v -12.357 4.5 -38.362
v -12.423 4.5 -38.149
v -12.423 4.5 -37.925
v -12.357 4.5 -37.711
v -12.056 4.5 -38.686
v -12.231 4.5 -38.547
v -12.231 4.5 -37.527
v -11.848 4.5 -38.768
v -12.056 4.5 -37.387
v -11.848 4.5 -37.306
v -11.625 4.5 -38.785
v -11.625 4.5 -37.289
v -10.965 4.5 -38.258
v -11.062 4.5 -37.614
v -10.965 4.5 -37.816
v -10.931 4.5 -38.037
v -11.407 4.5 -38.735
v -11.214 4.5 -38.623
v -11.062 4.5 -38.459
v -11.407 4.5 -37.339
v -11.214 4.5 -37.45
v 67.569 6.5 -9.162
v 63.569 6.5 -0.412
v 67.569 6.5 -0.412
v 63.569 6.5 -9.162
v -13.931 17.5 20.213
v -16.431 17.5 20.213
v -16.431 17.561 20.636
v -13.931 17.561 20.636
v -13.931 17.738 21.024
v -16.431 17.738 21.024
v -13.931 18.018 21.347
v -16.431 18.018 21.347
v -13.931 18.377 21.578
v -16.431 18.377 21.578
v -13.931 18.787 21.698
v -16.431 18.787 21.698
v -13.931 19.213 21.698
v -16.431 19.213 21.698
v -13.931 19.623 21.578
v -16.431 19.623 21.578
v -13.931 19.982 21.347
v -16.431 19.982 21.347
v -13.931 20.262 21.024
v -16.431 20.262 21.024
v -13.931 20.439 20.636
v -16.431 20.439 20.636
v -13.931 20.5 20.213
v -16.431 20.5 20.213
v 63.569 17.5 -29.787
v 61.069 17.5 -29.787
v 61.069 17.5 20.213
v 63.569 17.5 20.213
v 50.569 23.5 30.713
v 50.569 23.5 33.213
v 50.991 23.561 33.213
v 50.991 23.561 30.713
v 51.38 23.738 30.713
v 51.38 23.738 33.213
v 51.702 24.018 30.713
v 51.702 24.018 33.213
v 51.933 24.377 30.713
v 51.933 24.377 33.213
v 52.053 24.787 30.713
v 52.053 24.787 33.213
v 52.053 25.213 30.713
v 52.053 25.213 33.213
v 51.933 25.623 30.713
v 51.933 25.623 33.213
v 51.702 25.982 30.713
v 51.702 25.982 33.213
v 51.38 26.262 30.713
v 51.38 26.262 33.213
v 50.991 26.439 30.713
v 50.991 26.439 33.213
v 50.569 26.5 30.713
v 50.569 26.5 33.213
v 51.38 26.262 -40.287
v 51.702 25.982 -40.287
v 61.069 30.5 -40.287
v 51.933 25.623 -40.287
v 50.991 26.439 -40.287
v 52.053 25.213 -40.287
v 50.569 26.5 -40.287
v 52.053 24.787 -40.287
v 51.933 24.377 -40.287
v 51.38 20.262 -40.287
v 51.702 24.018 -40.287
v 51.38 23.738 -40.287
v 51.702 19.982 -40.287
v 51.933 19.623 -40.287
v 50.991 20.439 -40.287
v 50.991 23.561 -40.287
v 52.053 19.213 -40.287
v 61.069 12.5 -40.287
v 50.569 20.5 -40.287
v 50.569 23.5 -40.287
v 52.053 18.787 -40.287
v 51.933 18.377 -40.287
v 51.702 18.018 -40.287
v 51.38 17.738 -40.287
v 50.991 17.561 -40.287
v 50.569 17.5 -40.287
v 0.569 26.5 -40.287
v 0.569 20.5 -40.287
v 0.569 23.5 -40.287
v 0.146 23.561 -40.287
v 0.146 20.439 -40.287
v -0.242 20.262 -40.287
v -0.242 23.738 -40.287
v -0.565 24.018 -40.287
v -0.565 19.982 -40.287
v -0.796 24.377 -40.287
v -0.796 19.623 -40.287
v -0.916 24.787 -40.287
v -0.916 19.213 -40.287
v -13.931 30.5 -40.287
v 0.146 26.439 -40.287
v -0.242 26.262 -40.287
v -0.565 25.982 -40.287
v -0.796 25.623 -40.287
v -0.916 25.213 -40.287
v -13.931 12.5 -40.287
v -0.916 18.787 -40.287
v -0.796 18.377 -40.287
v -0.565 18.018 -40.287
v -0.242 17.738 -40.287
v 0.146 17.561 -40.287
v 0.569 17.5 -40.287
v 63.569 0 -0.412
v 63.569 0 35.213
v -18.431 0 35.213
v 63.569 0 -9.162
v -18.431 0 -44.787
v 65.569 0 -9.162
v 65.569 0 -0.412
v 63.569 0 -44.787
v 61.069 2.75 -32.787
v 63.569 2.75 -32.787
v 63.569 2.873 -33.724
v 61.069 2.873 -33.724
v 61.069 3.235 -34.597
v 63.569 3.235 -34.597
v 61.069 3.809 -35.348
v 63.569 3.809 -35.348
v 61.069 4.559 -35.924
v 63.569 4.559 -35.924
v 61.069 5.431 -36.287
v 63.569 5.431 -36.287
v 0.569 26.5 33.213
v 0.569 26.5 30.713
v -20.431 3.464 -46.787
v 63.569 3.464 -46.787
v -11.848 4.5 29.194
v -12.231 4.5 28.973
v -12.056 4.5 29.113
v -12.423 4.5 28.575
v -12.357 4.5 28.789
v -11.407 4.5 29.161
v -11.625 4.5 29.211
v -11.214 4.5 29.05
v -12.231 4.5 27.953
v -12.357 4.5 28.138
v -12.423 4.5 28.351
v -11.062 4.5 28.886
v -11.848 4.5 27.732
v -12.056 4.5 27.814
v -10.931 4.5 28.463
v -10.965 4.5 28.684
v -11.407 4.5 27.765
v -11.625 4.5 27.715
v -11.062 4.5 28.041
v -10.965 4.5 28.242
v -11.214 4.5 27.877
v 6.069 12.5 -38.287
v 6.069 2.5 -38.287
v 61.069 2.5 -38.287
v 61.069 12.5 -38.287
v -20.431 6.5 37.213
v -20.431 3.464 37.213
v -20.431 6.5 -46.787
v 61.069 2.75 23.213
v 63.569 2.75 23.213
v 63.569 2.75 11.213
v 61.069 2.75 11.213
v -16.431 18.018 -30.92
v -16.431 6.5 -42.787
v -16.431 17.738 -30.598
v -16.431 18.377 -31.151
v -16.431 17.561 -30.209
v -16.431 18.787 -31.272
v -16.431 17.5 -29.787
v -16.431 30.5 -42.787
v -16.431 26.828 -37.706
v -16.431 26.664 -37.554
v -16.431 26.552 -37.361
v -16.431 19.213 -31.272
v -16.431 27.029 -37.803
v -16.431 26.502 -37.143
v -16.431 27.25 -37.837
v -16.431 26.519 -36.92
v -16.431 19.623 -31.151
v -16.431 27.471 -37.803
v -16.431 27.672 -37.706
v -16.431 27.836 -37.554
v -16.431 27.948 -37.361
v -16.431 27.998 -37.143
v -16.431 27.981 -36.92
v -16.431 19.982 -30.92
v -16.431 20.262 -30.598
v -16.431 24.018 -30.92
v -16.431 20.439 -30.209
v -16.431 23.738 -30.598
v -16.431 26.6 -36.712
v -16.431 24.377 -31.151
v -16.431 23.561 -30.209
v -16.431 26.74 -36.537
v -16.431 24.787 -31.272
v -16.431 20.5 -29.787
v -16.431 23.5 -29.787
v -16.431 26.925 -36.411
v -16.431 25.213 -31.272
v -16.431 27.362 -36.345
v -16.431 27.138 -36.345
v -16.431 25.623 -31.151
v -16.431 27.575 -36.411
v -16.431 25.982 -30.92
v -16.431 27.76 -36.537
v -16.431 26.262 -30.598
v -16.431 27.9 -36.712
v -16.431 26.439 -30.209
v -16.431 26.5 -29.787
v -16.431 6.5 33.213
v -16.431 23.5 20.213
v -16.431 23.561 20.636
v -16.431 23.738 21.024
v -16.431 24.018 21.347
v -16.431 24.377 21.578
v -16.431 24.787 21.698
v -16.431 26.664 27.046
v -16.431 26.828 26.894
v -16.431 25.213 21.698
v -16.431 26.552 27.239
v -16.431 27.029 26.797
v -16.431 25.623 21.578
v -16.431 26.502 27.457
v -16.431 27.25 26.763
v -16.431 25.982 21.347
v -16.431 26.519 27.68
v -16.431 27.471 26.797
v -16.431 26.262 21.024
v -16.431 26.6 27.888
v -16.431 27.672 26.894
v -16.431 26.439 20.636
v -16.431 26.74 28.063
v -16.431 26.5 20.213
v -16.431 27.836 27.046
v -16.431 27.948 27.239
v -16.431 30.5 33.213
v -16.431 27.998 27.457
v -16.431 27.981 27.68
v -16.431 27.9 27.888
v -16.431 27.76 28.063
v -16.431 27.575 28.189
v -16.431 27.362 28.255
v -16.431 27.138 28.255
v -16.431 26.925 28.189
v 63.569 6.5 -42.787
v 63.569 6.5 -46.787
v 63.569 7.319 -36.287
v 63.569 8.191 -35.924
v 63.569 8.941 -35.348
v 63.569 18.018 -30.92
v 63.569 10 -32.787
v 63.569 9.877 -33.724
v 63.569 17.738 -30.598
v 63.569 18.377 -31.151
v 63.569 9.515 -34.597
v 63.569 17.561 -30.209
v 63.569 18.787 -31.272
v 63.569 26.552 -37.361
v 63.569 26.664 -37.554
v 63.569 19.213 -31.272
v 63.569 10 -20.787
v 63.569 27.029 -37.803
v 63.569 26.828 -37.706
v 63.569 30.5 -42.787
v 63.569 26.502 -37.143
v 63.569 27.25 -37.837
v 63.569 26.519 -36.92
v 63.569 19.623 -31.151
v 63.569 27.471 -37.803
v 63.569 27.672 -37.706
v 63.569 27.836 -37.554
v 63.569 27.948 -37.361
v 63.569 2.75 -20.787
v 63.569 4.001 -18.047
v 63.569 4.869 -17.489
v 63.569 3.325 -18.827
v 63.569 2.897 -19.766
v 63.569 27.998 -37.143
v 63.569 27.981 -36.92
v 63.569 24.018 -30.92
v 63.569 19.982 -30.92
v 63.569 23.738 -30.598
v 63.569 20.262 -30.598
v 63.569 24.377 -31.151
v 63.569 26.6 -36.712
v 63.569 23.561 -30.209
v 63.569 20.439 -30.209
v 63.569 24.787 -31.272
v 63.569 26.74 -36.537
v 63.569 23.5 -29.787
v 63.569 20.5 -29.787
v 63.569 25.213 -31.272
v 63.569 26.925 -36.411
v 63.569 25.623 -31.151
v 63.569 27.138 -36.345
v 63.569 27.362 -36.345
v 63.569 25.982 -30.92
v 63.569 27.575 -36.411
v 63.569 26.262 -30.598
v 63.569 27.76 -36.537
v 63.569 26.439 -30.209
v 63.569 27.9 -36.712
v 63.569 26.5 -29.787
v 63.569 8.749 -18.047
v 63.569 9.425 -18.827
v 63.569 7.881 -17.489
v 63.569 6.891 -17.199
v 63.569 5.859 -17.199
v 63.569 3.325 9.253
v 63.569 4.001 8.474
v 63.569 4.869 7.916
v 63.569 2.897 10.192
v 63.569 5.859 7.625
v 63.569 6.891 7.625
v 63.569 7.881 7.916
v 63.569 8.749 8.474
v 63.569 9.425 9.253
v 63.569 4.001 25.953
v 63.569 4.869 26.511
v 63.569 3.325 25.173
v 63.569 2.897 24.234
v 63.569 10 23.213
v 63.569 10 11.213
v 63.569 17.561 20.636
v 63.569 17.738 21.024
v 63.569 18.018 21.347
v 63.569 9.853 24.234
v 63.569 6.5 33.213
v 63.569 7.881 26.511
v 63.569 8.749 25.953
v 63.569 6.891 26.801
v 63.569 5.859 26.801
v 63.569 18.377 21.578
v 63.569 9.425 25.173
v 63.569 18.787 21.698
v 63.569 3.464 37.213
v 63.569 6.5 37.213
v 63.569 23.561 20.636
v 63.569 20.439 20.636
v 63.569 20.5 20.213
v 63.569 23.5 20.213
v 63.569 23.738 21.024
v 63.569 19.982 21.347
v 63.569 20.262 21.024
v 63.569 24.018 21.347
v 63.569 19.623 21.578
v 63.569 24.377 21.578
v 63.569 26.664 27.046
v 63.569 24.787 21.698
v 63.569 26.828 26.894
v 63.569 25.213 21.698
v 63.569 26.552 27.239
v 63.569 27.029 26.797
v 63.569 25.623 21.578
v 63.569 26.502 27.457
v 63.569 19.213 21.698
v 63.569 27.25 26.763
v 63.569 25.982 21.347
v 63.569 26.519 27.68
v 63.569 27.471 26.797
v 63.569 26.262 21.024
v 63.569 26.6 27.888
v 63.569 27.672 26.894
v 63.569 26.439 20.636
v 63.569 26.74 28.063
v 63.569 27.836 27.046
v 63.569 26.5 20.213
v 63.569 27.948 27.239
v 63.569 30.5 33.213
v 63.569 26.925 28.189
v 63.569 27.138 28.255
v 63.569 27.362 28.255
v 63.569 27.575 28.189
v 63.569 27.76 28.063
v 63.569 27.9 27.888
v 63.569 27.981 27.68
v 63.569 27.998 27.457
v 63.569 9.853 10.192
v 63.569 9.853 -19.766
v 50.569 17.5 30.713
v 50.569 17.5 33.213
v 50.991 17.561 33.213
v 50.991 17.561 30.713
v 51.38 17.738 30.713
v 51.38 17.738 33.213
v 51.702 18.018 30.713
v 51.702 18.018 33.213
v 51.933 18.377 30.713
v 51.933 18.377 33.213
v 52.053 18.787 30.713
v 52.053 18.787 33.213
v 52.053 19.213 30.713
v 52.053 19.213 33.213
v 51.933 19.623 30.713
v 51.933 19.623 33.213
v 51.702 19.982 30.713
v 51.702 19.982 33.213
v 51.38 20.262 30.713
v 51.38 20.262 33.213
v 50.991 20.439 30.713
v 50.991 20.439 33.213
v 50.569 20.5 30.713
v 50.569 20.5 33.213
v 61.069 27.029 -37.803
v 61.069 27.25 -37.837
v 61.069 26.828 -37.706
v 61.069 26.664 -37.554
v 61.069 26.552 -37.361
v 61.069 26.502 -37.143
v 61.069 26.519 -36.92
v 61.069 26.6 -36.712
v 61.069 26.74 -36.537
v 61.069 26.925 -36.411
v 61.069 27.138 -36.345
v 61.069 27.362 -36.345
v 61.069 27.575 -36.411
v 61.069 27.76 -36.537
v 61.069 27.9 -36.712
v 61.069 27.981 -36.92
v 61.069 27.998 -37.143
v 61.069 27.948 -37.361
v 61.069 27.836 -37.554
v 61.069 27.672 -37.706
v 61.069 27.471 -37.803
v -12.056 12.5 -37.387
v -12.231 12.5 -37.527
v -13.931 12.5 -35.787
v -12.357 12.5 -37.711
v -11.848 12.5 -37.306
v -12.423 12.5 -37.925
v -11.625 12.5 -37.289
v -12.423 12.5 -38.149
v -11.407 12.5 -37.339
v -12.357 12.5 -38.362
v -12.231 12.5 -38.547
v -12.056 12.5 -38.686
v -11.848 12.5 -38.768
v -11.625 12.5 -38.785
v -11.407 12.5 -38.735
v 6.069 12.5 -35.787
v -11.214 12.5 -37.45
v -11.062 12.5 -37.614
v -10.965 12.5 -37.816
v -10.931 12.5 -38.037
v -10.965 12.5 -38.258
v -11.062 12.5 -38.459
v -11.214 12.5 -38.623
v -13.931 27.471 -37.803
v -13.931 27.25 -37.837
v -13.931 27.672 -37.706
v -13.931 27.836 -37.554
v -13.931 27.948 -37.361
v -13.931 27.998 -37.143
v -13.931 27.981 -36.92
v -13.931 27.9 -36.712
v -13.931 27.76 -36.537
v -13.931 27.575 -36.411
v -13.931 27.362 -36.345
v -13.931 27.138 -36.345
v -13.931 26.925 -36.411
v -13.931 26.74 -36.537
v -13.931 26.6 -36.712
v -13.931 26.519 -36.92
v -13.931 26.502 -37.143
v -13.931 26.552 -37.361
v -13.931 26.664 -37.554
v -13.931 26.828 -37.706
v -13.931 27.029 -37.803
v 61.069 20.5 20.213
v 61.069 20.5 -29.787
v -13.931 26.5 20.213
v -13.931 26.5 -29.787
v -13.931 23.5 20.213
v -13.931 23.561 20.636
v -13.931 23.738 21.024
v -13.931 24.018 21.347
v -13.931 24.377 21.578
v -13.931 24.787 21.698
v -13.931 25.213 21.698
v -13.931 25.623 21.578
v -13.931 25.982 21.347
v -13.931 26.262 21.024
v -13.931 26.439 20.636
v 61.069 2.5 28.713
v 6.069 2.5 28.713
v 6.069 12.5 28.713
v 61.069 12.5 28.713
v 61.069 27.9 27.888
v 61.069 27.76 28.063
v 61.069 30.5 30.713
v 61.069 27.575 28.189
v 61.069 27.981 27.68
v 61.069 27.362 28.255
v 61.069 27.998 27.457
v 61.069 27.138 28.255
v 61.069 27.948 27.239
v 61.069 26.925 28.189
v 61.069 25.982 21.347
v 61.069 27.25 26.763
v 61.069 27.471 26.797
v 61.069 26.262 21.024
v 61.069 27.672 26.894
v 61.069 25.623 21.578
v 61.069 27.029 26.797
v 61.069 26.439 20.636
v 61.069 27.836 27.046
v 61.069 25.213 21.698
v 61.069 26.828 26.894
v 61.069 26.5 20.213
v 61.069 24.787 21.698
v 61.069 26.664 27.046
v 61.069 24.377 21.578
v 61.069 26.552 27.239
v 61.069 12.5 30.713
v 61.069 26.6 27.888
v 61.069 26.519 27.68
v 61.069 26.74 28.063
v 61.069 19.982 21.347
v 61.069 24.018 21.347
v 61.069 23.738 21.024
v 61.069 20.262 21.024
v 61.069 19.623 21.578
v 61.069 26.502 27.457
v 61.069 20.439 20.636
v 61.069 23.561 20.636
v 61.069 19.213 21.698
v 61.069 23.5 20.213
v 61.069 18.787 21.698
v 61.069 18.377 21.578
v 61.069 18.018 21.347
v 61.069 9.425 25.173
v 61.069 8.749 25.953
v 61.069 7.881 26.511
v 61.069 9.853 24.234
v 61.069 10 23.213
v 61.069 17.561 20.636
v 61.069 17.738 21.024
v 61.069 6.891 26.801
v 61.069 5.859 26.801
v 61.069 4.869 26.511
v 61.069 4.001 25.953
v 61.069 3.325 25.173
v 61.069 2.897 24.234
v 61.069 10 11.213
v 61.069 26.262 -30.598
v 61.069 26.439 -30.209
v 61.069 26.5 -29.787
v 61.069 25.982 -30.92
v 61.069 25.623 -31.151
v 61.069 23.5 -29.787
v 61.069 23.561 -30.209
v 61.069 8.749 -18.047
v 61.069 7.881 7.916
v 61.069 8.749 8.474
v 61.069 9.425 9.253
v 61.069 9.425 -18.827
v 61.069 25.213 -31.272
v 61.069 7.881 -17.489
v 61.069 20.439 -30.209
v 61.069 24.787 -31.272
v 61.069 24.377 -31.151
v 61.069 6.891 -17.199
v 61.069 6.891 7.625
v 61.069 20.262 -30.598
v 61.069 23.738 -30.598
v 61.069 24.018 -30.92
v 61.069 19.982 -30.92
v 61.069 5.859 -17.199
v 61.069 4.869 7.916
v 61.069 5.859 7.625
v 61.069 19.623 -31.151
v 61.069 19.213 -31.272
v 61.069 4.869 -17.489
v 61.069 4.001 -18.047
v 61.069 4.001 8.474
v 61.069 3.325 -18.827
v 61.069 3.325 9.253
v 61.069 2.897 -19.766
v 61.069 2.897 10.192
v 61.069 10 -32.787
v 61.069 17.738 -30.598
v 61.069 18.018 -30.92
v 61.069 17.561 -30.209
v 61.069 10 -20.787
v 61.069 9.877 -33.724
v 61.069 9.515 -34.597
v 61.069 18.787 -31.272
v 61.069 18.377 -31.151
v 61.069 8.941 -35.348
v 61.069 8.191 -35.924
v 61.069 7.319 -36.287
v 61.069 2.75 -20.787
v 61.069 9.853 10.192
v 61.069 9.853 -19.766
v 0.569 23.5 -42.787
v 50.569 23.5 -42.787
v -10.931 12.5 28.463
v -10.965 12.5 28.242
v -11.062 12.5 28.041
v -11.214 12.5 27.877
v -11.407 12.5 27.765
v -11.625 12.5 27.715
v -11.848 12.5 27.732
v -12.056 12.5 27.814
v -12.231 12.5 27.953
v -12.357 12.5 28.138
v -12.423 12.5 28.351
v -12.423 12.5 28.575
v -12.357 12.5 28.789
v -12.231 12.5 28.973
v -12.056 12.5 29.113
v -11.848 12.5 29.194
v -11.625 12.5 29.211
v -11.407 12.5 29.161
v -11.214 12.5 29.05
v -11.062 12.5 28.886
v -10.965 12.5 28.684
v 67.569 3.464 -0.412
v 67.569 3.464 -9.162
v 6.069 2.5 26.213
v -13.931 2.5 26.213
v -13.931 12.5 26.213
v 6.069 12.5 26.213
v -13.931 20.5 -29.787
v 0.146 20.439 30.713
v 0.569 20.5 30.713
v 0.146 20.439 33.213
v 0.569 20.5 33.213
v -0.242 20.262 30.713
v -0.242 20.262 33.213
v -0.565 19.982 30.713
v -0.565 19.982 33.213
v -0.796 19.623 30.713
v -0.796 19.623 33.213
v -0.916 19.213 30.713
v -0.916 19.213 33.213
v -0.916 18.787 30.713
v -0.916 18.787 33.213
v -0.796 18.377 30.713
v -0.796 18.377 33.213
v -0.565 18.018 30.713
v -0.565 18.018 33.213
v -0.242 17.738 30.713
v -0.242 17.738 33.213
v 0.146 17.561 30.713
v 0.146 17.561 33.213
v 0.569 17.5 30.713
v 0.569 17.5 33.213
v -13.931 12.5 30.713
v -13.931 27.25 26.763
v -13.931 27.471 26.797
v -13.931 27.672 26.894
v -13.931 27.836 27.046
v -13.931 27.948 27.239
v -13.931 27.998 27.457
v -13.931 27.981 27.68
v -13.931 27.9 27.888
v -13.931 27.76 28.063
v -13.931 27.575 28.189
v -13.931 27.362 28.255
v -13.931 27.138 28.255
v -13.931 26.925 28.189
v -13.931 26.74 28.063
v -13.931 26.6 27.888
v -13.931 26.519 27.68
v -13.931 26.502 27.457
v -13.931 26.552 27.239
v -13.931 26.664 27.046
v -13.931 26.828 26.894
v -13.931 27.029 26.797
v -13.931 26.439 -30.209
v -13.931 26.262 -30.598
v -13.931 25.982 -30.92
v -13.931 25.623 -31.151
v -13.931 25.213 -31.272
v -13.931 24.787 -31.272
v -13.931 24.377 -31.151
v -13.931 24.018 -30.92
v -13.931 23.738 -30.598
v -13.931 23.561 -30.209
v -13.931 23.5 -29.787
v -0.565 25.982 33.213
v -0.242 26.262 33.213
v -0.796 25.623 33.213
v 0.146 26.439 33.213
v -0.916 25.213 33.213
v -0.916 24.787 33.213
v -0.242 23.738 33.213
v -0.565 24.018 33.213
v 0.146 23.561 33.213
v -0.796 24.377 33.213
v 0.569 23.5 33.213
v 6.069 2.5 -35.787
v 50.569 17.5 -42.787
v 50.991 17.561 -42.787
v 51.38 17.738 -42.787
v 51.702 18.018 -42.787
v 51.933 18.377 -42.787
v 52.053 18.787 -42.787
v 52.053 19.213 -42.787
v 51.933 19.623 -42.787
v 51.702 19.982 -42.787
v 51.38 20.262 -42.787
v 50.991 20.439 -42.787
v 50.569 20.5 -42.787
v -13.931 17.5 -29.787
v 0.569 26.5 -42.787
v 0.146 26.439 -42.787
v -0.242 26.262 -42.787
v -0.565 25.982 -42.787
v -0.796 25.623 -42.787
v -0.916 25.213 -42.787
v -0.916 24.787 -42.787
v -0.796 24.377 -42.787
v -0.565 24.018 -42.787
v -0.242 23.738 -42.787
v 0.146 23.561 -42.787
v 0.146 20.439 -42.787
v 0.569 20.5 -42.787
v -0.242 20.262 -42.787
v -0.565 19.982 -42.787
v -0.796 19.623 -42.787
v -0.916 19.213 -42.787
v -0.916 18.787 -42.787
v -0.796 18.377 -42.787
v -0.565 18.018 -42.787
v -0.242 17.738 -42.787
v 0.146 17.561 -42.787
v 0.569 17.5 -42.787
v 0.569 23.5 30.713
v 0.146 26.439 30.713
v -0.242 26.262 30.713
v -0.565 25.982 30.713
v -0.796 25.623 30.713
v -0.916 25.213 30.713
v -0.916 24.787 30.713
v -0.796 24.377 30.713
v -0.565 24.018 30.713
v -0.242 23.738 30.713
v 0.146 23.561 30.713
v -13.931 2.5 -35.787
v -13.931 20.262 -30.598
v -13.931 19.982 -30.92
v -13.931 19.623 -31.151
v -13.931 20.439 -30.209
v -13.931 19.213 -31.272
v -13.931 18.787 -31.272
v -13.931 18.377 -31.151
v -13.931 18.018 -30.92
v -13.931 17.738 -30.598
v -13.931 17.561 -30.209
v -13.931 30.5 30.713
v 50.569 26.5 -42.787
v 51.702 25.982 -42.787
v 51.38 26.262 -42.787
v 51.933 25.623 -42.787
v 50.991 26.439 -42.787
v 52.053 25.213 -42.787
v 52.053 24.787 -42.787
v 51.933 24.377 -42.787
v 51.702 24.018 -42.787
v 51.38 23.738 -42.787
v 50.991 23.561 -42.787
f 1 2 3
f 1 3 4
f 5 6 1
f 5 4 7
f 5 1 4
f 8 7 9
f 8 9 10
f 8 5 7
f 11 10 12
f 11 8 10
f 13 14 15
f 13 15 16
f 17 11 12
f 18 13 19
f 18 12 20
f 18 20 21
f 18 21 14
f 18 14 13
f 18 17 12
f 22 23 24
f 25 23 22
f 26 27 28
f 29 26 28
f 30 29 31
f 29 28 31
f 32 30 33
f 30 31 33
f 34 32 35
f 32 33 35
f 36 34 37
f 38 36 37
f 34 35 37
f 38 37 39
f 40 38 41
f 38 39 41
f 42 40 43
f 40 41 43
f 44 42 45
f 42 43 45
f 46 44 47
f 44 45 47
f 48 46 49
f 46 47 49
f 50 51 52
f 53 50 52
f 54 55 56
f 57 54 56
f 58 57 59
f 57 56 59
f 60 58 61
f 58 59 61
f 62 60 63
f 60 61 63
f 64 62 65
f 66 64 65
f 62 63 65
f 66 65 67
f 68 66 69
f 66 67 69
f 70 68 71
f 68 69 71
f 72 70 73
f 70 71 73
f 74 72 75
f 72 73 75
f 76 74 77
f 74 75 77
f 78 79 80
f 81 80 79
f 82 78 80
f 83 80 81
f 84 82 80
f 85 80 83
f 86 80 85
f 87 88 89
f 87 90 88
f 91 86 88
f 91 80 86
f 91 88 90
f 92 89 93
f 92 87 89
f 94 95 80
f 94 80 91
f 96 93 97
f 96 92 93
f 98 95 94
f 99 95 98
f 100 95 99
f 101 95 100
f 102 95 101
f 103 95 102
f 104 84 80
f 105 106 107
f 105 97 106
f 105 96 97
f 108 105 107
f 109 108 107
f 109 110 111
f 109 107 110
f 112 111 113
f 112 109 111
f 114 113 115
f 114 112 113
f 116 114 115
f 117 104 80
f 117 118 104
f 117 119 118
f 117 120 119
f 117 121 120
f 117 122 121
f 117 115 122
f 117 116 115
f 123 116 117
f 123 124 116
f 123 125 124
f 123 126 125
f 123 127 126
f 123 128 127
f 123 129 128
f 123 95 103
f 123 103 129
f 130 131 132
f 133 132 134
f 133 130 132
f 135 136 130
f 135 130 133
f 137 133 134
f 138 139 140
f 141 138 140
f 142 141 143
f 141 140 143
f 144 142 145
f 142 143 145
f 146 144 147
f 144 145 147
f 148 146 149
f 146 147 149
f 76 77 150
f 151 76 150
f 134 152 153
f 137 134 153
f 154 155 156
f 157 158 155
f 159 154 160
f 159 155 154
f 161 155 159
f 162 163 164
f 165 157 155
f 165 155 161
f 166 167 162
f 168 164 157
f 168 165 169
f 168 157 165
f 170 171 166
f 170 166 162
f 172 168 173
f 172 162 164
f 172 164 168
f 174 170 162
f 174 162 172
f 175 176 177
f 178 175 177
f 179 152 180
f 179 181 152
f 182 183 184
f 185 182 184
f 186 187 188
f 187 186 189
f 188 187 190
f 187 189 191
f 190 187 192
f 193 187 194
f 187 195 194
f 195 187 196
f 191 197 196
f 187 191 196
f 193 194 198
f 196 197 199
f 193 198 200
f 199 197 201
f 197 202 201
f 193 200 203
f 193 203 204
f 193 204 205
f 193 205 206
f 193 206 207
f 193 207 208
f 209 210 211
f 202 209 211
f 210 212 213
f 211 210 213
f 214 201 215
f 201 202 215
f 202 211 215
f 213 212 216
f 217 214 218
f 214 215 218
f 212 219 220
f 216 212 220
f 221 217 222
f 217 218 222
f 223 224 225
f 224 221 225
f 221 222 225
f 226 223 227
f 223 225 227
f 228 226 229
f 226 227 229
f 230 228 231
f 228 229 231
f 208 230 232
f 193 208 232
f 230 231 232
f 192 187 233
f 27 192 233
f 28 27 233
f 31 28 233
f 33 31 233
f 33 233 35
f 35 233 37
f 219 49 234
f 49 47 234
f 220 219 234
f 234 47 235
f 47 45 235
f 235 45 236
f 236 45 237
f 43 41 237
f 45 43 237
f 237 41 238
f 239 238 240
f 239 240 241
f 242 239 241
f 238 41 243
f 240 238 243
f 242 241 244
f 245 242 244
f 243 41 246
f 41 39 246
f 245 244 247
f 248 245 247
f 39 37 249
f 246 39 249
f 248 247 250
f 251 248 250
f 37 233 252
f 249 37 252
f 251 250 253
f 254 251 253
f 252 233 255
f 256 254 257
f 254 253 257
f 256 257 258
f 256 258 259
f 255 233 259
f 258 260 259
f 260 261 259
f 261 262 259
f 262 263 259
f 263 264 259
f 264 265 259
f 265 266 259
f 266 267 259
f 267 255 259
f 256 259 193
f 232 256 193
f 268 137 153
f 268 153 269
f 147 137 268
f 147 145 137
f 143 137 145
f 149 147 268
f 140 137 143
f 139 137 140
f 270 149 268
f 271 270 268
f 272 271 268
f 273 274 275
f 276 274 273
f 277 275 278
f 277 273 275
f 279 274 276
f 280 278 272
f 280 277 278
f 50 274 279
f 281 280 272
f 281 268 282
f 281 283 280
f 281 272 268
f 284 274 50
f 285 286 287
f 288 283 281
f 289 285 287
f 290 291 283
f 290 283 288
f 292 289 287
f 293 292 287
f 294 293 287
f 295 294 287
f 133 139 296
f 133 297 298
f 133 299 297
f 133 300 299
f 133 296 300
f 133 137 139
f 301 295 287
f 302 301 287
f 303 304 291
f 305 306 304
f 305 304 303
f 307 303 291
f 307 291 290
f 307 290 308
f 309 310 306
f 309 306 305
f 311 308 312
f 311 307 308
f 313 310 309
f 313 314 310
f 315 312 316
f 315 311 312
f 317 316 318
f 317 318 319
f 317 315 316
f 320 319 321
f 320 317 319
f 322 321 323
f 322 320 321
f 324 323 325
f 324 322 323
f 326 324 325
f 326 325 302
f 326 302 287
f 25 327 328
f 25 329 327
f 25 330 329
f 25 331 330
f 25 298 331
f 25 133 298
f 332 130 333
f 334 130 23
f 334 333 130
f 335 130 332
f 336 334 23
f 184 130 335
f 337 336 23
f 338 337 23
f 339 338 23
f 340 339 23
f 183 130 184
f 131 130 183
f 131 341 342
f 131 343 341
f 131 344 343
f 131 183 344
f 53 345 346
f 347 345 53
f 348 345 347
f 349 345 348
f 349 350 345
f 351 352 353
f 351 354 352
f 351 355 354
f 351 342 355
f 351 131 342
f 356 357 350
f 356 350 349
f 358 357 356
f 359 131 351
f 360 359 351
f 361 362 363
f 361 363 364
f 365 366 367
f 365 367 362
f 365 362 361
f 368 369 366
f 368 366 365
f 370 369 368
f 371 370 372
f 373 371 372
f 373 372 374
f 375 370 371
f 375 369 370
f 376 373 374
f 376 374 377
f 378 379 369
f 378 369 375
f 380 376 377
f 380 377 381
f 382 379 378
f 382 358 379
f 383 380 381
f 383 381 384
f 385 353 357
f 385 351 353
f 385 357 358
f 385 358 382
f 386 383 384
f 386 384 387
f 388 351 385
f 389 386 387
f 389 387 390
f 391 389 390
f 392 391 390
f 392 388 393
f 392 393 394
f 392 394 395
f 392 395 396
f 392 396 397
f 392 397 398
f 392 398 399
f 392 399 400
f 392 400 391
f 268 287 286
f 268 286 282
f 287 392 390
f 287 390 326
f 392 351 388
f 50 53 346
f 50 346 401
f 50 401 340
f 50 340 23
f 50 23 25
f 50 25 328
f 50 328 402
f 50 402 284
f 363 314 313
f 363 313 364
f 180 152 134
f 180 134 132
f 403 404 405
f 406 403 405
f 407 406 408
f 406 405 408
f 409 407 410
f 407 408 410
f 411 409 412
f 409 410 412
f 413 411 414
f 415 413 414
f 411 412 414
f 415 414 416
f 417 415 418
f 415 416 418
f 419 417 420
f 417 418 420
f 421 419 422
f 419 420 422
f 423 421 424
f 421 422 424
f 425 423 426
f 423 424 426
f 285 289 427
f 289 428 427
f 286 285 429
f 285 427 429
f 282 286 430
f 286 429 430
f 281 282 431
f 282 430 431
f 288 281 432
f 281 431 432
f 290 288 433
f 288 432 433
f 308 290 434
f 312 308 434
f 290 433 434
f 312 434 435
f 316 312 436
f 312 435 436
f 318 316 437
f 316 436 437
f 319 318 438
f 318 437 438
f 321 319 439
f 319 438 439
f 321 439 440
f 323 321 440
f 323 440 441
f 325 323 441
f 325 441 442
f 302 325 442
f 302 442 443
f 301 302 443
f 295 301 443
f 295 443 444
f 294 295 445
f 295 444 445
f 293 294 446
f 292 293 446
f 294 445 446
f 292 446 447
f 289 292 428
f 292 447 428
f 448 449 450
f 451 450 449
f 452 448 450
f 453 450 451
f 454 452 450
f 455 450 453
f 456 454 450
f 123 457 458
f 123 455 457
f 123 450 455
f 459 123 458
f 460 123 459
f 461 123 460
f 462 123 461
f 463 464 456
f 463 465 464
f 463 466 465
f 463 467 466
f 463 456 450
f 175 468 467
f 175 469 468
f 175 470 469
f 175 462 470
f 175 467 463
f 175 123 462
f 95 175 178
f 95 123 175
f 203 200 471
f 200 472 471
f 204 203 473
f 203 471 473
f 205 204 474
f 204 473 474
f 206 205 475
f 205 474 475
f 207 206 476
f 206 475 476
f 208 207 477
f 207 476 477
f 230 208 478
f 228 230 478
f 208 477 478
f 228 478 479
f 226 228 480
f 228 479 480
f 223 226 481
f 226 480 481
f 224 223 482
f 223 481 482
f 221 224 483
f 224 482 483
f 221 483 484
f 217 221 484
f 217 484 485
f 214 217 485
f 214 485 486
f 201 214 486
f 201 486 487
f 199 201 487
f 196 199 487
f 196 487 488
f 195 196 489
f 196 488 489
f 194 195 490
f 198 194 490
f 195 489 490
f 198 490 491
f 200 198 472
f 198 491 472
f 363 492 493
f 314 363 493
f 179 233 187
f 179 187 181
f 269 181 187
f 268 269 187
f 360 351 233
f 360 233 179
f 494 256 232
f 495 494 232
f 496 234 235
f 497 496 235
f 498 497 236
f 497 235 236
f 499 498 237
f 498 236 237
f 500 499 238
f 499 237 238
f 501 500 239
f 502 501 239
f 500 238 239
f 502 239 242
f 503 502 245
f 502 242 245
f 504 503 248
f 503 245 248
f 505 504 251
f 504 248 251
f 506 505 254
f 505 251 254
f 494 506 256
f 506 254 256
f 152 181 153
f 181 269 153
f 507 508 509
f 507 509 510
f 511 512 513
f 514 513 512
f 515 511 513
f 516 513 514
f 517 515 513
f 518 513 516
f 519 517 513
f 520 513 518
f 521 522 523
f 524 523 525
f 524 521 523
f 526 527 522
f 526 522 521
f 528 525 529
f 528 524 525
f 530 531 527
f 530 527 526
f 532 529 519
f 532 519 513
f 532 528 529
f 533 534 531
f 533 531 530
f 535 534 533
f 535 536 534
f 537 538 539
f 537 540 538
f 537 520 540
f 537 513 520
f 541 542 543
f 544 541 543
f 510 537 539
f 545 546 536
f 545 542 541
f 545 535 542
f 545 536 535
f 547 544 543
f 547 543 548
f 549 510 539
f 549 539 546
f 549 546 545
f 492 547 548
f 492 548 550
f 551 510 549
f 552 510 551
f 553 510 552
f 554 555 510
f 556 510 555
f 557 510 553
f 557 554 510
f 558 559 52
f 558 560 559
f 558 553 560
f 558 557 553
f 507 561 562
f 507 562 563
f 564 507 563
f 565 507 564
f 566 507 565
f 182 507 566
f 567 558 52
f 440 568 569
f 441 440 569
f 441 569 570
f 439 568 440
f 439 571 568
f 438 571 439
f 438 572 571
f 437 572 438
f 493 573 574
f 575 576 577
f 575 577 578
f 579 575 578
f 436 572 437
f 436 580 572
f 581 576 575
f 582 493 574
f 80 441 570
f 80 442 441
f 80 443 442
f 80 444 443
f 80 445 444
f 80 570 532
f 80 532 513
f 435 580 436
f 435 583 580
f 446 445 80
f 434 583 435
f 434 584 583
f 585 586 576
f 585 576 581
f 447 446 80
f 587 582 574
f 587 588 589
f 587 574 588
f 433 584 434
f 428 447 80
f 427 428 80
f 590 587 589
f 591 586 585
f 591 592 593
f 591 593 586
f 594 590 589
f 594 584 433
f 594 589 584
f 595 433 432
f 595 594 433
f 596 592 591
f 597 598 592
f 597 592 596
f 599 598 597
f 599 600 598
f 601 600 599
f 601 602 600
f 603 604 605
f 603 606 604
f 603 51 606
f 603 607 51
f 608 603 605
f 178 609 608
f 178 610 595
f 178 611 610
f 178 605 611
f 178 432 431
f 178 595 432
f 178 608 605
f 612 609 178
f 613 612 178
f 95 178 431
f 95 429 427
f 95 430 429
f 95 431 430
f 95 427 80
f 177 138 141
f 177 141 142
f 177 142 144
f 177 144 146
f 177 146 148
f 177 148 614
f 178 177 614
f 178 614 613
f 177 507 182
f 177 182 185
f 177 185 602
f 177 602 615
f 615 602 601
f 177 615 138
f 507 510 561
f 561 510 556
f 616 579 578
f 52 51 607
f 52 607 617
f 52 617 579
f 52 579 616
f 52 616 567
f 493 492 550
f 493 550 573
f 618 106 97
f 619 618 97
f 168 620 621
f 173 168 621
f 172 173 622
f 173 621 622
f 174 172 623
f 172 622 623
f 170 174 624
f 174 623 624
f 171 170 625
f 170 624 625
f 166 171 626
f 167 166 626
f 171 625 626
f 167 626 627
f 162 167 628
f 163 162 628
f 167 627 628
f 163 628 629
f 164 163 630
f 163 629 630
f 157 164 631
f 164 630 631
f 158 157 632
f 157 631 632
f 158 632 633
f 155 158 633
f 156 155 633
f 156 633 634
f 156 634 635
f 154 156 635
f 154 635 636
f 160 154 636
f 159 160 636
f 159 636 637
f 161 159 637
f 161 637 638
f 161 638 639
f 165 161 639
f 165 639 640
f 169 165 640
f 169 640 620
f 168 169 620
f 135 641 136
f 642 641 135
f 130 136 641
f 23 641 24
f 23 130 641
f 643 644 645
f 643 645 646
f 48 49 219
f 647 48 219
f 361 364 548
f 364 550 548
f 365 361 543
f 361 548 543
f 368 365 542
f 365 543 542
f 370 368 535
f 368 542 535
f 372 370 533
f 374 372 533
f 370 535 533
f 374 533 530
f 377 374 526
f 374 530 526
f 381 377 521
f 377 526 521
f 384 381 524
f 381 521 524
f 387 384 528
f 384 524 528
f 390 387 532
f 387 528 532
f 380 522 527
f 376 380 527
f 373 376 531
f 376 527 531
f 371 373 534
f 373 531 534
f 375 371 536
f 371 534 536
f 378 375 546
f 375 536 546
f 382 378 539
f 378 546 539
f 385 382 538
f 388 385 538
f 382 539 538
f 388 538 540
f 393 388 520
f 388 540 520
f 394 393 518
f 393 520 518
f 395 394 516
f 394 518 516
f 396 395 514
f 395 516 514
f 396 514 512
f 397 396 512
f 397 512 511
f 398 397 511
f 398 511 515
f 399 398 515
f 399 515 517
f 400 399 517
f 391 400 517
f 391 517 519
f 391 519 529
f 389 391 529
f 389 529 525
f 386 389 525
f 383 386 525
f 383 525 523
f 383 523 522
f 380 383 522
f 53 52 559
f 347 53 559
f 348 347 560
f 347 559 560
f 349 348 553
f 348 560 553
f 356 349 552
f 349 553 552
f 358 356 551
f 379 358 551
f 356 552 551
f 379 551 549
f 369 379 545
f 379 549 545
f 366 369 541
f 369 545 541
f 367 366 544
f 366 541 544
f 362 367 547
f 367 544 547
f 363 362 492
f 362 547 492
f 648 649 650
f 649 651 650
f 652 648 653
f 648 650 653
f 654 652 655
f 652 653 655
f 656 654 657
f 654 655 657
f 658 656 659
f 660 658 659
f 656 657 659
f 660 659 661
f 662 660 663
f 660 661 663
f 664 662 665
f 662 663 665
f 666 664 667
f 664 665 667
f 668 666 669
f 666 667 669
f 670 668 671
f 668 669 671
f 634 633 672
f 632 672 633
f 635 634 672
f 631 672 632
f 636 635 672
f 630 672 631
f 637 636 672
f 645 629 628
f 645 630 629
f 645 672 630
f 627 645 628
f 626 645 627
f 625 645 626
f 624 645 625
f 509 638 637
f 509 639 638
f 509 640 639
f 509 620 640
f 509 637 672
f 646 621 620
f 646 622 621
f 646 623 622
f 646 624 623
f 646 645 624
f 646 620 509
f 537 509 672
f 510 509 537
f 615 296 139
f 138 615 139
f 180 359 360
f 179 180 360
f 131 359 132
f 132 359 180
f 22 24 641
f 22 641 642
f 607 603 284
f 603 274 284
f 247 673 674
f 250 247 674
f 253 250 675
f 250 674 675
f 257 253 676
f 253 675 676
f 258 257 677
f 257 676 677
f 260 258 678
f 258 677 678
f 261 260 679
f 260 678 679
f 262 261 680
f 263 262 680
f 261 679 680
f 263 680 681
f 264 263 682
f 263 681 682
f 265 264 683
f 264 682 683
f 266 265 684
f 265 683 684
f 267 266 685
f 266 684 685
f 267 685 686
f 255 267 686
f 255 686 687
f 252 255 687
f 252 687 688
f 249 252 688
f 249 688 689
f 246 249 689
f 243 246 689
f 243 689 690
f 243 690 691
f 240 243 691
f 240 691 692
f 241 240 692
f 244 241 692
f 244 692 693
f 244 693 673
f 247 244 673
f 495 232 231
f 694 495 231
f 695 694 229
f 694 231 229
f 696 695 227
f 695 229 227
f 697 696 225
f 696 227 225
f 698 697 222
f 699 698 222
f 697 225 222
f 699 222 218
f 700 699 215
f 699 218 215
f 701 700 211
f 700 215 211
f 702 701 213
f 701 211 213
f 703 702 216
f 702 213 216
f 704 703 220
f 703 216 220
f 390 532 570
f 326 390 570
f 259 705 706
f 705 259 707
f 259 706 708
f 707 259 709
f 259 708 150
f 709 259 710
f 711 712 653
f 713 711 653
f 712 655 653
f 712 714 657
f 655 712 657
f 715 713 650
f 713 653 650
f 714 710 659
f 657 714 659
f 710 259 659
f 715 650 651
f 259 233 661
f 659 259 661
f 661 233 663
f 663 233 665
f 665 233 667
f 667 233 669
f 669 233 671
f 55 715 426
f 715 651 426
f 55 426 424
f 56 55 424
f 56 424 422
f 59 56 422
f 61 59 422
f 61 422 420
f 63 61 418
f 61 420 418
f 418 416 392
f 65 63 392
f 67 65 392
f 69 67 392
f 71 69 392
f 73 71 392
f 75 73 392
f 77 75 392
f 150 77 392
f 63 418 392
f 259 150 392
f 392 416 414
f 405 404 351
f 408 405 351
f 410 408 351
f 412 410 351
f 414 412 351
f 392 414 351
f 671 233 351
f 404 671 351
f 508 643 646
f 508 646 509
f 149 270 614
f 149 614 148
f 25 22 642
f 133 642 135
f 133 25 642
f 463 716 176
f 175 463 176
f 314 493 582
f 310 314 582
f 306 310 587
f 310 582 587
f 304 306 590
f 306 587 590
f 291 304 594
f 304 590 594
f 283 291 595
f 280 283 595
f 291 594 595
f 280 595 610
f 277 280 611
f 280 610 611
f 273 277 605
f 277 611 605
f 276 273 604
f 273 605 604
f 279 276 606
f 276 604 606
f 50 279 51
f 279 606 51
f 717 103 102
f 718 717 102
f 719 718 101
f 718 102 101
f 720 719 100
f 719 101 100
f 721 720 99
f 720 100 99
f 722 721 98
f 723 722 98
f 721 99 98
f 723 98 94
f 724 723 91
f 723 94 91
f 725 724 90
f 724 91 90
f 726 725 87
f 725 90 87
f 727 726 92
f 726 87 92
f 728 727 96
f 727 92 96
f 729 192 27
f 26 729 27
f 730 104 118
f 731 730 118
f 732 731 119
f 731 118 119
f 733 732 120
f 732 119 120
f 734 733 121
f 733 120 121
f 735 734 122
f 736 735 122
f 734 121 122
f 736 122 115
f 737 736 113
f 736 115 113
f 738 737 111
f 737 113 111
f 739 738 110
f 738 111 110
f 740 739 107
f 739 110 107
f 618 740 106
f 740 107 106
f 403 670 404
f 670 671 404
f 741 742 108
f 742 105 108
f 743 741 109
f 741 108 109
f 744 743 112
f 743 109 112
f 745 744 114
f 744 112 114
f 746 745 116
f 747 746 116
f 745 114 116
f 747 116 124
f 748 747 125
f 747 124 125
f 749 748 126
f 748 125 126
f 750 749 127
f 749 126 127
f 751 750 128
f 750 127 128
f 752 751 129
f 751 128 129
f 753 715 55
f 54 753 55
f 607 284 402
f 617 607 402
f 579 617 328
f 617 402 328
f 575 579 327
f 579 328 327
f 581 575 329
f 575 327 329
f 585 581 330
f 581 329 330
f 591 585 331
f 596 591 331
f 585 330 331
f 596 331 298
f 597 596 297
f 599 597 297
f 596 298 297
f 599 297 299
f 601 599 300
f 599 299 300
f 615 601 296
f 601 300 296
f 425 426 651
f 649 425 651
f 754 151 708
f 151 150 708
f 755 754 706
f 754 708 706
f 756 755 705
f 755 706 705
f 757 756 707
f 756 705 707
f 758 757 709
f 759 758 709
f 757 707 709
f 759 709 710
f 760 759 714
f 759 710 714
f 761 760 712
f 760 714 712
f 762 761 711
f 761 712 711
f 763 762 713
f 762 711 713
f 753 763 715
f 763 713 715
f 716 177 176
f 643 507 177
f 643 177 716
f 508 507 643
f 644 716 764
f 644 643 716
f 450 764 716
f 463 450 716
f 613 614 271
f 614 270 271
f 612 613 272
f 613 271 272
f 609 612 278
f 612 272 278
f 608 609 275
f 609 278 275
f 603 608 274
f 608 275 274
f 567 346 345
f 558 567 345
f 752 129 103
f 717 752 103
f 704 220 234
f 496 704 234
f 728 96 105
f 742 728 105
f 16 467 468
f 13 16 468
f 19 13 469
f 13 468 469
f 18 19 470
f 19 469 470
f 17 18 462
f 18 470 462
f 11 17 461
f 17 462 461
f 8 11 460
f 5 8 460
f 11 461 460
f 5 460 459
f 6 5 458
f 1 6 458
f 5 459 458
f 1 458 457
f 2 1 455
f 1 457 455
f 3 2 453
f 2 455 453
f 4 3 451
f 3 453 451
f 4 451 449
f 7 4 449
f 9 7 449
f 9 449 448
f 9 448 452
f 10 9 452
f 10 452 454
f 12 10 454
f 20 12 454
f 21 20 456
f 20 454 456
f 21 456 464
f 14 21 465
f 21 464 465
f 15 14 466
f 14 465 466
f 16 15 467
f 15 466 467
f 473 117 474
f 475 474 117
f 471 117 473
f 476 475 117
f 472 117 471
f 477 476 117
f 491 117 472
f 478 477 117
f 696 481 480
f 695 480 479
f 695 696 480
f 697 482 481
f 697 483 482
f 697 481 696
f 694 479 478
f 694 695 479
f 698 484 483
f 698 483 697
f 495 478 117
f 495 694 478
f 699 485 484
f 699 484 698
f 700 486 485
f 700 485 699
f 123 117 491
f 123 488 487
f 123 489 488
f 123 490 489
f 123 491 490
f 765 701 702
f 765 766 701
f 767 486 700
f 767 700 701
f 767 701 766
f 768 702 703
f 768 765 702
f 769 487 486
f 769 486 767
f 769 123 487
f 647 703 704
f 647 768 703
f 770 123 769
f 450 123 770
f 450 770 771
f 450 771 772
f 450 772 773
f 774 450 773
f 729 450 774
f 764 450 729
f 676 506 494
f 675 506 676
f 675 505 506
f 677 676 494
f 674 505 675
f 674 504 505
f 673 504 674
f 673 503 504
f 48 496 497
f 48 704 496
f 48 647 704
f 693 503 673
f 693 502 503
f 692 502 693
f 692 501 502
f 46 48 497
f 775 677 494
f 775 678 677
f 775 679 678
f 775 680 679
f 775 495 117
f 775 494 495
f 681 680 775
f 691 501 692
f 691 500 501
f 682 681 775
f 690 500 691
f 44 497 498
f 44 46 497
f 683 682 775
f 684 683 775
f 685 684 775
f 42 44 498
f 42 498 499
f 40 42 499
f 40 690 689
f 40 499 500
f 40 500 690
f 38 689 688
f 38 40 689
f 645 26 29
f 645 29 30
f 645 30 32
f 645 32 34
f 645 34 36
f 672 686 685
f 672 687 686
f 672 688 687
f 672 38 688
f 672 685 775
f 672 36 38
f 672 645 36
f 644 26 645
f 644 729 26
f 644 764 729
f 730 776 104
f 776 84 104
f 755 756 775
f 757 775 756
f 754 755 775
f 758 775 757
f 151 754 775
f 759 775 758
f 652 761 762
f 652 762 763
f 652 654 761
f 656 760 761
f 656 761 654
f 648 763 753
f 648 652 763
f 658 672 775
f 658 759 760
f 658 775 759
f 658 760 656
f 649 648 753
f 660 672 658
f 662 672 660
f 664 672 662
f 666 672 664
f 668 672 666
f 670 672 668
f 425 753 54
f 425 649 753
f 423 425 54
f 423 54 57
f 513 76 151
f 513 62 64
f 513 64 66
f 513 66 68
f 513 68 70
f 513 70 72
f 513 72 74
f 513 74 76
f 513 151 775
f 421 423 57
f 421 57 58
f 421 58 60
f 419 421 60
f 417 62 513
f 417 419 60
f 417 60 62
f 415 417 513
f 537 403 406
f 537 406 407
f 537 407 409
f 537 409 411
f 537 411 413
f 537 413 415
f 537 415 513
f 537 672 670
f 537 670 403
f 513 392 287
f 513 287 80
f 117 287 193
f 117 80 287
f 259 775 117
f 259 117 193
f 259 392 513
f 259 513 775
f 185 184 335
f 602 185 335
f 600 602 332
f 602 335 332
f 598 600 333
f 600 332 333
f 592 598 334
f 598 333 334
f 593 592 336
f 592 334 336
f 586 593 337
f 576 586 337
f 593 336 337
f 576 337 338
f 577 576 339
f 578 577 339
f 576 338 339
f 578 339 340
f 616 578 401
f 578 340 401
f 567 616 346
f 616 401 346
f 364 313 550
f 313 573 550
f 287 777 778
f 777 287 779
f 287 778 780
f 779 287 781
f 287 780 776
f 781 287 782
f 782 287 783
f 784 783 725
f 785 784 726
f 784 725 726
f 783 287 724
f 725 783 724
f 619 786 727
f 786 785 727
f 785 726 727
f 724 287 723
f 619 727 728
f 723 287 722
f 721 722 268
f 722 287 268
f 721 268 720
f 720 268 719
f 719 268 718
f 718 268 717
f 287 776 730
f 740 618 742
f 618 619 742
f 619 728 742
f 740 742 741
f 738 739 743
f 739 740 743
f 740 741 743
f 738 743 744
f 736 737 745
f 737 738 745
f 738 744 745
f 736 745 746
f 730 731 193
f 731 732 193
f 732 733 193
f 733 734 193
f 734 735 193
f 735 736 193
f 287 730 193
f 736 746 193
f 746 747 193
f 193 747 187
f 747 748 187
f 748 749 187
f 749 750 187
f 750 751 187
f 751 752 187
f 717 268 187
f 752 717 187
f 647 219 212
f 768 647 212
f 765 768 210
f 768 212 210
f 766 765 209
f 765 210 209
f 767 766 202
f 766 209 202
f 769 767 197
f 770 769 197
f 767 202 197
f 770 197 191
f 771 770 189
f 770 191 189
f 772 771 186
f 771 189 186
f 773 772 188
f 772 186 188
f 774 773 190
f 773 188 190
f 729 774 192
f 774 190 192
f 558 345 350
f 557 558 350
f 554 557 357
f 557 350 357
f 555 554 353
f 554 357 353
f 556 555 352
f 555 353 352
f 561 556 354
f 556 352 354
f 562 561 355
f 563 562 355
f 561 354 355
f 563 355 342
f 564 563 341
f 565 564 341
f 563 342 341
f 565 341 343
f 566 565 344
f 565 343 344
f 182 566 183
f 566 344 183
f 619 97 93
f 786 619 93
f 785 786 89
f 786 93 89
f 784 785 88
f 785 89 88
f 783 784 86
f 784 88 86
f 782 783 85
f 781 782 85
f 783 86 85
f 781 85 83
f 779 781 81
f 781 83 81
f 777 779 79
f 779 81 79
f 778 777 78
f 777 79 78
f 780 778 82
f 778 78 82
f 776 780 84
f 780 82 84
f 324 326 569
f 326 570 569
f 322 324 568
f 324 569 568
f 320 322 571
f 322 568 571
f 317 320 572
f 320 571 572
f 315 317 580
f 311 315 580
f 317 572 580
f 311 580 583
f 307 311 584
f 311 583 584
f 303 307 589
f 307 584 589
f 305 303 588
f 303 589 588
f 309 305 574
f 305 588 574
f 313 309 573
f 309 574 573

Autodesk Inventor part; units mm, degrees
ref_plane "YZ Plane" through (0, 0, 0) normal (1, 0, 0) x (0, 1, 0)
ref_plane "XZ Plane" through (0, 0, 0) normal (0, 1, 0) x (-1, 0, 0)
ref_plane "XY Plane" through (0, 0, 0) normal (0, 0, 1) x (1, 0, 0)
sketch "Skizze1" plane through (0, 0, 0) normal (0, 1, 0) x (-1, 0, 0)
  line L0 (16.4314, 33.2132) -> (-63.5686, 33.2132)
  line L1 (-63.5686, 33.2132) -> (-63.5686, -42.7868)
  line L2 (-63.5686, -42.7868) -> (16.4314, -42.7868)
  line L3 (16.4314, -42.7868) -> (16.4314, 33.2132)
  point P0 (0, 0)
  dimension "d0" = 76
  dimension "d1" = 80
extrude "Extrusion1" add sketch "Skizze1" along normal blind 30.5
shell "Wandung1" thickness 2.5 removed faces 1 at (36.9019, 30.5, 7.8799)
sketch "Skizze2" plane through (-13.9314, 2.5, -40.2868) normal (0, 1, 0) x (1, 0, 0)
  line L0 (0, -71) -> (0, 0) projected
  line L1 (75, 0) -> (75, -71) projected
  line L2 (75, -71) -> (75, 0) projected
  line L3 (0, 0) -> (0, -71) projected
  line L4 (0, -71) -> (0, -66.5)
  line L5 (0, -66.5) -> (20, -66.5)
  line L6 (20, -66.5) -> (20, -69)
  line L7 (20, -69) -> (75, -69)
  line L8 (75, -69) -> (75, -71)
  line L9 (0, -71) -> (75, -71) projected
  line L10 (0, -35.5) -> (75, -35.5)
  line L11 (0, 0) -> (0, -4.5)
  line L12 (0, -4.5) -> (20, -4.5)
  line L13 (20, -4.5) -> (20, -2)
  line L14 (20, -2) -> (75, -2)
  line L15 (75, -2) -> (75, 0)
  line L16 (0, 0) -> (75, 0)
  point P0 (75, 0)
  point P1 (75, -2)
  point P2 (0, -4.5)
  point P3 (0, -66.5)
  dimension "d35" = 4.5
  dimension "d36" = 2
  dimension "d37" = 20
extrude "Extrusion2" add sketch "Skizze2" along normal blind 10 contours L0 L5 L6 L7 L1 L9 | L0 L16 L1 L14 L13 L12
sketch "Skizze3" plane through (-13.9314, 12.5, -40.2868) normal (0, 1, 0) x (1, 0, 0)
  circle A0 centre (2.25, -68.75) radius 0.75
  line L0 (2.25, -68.75) -> (2.25, -66.5) construction
  line L1 (2.25, -68.75) -> (0, -68.75) construction
  line L2 (0, -71) -> (0, 0) construction
  line L3 (75, 0) -> (75, -71) construction
  line L4 (75, -71) -> (0, -71) construction
  circle A1 centre (2.25, -2.25) radius 0.75
  line L5 (0, 0) -> (75, 0) projected
  point P0 (13.9314, -40.2868)
  dimension "d8" = 1.5
  dimension "d14" = 2.25
  dimension "d38" = 2.25
  dimension "d39" = 2.25
  dimension "d40" = 2.25
extrude "Extrusion3" cut sketch "Skizze3" against normal blind 8
sketch "Skizze6" plane through (63.5686, 0, 33.2132) normal (1, 0, 0) x (0, 0, -1)
  line L0 (69.5, 10) -> (69.5, 2.75)
  line L1 (0, 0) -> (76, 0) projected
  line L2 (76, 0) -> (76, 30.5) projected
  line L3 (0, 0) -> (0, 30.5) projected
  line L4 (10, 6.375) -> (22, 6.375) construction
  line L5 (10, 2.75) -> (22, 2.75)
  line L6 (22, 10) -> (10, 10)
  arc A0 (10, 10) -> (10, 2.75) centre (10, 6.375) ccw
  arc A1 (22, 2.75) -> (22, 10) centre (22, 6.375) ccw
  line L7 (54, 6.375) -> (66, 6.375) construction
  line L8 (54, 2.75) -> (66, 2.75)
  line L9 (66, 10) -> (54, 10)
  arc A2 (54, 10) -> (54, 2.75) centre (54, 6.375) ccw
  arc A3 (66, 2.75) -> (66, 10) centre (66, 6.375) ccw
  point P0 (33.2132, 0)
  point P1 (16, 6.375)
  point P2 (60, 6.375)
  point P3 (69.5, 5.4313)
  point P4 (69.5, 7.3187)
  dimension "d31" = 6.5
  dimension "d59" = 7.25
  dimension "d60" = 2.75
  dimension "d61" = 10
  dimension "d62" = 12
  dimension "d63" = 7.25
  dimension "d64" = 12
  dimension "d65" = 2.75
  dimension "d66" = 10
extrude "Extrusion6" cut sketch "Skizze6" against normal blind 10 contours L0 A3 L8 A2 L9 | A0 L6 A1 L5
sketch "Skizze8" plane through (-13.9314, 30.5, 30.7132) normal (1, 0, 0) x (0, 0, -1)
  circle A0 centre (3.2, -3.25) radius 0.75
  circle A1 centre (67.8, -3.25) radius 0.75
  line L0 (0, -18) -> (0, 0) projected
  line L1 (0, 0) -> (71, 0) projected
  line L2 (71, -18) -> (71, 0) projected
  line L3 (10.5, -5.5) -> (60.5, -5.5) construction
  line L4 (10.5, -4) -> (60.5, -4)
  line L5 (60.5, -7) -> (10.5, -7)
  arc A2 (10.5, -4) -> (10.5, -7) centre (10.5, -5.5) ccw
  arc A3 (60.5, -7) -> (60.5, -4) centre (60.5, -5.5) ccw
  line L6 (10.5, -11.5) -> (60.5, -11.5) construction
  line L7 (10.5, -10) -> (60.5, -10)
  line L8 (60.5, -13) -> (10.5, -13)
  arc A4 (10.5, -10) -> (10.5, -13) centre (10.5, -11.5) ccw
  arc A5 (60.5, -13) -> (60.5, -10) centre (60.5, -11.5) ccw
  point P0 (30.7132, -30.5)
  point P1 (35.5, -5.5)
  point P2 (35.5, -11.5)
  dimension "d43" = 1.5
  dimension "d44" = 3.2
  dimension "d45" = 3.25
  dimension "d46" = 3.2
  dimension "d47" = 3.25
  dimension "d50" = 3
  dimension "d51" = 4
  dimension "d53" = 50
  dimension "d54" = 3
  dimension "d55" = 50
  dimension "d56" = 35.5
  dimension "d57" = 3
  dimension "d58" = 35.5
extrude "Extrusion7" cut sketch "Skizze8" along normal through all both and the other way through all
sketch "Skizze9" plane through (61.0686, 30.5, 30.7132) normal (0, 0, -1) x (-1, 0, 0)
  line L0 (10.5, -5.5) -> (60.5, -5.5) construction
  line L1 (77.5, 0) -> (-2.5, 0) projected
  line L2 (10.5, -4) -> (60.5, -4)
  line L3 (60.5, -7) -> (10.5, -7)
  arc A0 (10.5, -4) -> (10.5, -7) centre (10.5, -5.5) ccw
  arc A1 (60.5, -7) -> (60.5, -4) centre (60.5, -5.5) ccw
  line L4 (0, -18) -> (0, 0) projected
  line L5 (10.5, -11.5) -> (60.5, -11.5) construction
  line L6 (10.5, -10) -> (60.5, -10)
  line L7 (60.5, -13) -> (10.5, -13)
  arc A2 (10.5, -10) -> (10.5, -13) centre (10.5, -11.5) ccw
  arc A3 (60.5, -13) -> (60.5, -10) centre (60.5, -11.5) ccw
  point P0 (61.0686, -30.5)
  point P1 (35.5, -5.5)
  point P2 (35.5, -11.5)
  dimension "d67" = 50
  dimension "d68" = 35.5
  dimension "d69" = 3
  dimension "d70" = 4
  dimension "d71" = 50
  dimension "d72" = 3
  dimension "d73" = 35.5
  dimension "d74" = 3
extrude "Extrusion8" cut sketch "Skizze9" along normal through all both and the other way through all
sketch "Skizze10" plane through (-16.4314, 0, 33.2132) normal (0, 0, 1) x (1, 0, 0)
  line L0 (0, 0) -> (0, 30.5) projected
  line L1 (80, 0) -> (0, 0)
  line L2 (0, 0) -> (0, 6.5)
  line L3 (0, 6.5) -> (80, 6.5)
  line L4 (80, 6.5) -> (80, 0)
  point P0 (16.4314, 0)
  dimension "d77" = 6.5
extrude "Extrusion9" add sketch "Skizze10" along normal blind 4
sketch "Skizze11" plane through (63.5686, 0, -42.7868) normal (0, 0, -1) x (-1, 0, 0)
  line L0 (0, 0) -> (0, 30.5) projected
  line L1 (80, 0) -> (80, 30.5) projected
  line L2 (0, 0) -> (80, 0)
  line L3 (80, 0) -> (80, 6.5)
  line L4 (80, 6.5) -> (0, 6.5)
  line L5 (0, 6.5) -> (0, 0)
  point P0 (63.5686, 0)
  point P1 (0, 6.5)
  dimension "d80" = 6.5
extrude "Extrusion10" add sketch "Skizze11" along normal blind 4
sketch "Skizze12" plane through (-16.4314, 30.5, -42.7868) normal (-1, 0, 0) x (0, 0, 1)
  line L0 (80, -30.5) -> (-4, -30.5) projected
  line L1 (76, -24) -> (80, -24) projected
  line L2 (-4, -30.5) -> (80, -30.5)
  line L3 (80, -30.5) -> (80, -24)
  line L4 (80, -24) -> (-4, -24)
  line L5 (-4, -24) -> (-4, -30.5)
  point P0 (42.7868, -30.5)
extrude "Extrusion11" add sketch "Skizze12" along normal blind 4
sketch "Skizze13" plane through (63.5686, 30.5, 33.2132) normal (1, 0, 0) x (0, 0, -1)
  line L0 (33.625, -24) -> (42.375, -24)
  line L1 (42.375, -24) -> (42.375, -30.5)
  line L2 (42.375, -30.5) -> (33.625, -30.5)
  line L3 (33.625, -30.5) -> (33.625, -24)
  line L4 (-4, -30.5) -> (80, -30.5) projected
  arc A0 (22, -27.75) -> (22, -20.5) centre (22, -24.125) ccw projected
  point P0 (33.2132, -30.5)
  dimension "d85" = 6.5
  dimension "d86" = 8.75
  dimension "d87" = 15.25
extrude "Extrusion12" add sketch "Skizze13" along normal blind 4
chamfer "Fase1" distance 2 angle 60 4 edges at (21.5686, 0, 37.2132) (-20.4314, 0, -4.7868) (21.5686, 0, -46.7868) (67.5686, 0, -4.7868) measured on face at (7.5686, 0, -3.3285)
properties part number "GameFrameRaspiBox1"
